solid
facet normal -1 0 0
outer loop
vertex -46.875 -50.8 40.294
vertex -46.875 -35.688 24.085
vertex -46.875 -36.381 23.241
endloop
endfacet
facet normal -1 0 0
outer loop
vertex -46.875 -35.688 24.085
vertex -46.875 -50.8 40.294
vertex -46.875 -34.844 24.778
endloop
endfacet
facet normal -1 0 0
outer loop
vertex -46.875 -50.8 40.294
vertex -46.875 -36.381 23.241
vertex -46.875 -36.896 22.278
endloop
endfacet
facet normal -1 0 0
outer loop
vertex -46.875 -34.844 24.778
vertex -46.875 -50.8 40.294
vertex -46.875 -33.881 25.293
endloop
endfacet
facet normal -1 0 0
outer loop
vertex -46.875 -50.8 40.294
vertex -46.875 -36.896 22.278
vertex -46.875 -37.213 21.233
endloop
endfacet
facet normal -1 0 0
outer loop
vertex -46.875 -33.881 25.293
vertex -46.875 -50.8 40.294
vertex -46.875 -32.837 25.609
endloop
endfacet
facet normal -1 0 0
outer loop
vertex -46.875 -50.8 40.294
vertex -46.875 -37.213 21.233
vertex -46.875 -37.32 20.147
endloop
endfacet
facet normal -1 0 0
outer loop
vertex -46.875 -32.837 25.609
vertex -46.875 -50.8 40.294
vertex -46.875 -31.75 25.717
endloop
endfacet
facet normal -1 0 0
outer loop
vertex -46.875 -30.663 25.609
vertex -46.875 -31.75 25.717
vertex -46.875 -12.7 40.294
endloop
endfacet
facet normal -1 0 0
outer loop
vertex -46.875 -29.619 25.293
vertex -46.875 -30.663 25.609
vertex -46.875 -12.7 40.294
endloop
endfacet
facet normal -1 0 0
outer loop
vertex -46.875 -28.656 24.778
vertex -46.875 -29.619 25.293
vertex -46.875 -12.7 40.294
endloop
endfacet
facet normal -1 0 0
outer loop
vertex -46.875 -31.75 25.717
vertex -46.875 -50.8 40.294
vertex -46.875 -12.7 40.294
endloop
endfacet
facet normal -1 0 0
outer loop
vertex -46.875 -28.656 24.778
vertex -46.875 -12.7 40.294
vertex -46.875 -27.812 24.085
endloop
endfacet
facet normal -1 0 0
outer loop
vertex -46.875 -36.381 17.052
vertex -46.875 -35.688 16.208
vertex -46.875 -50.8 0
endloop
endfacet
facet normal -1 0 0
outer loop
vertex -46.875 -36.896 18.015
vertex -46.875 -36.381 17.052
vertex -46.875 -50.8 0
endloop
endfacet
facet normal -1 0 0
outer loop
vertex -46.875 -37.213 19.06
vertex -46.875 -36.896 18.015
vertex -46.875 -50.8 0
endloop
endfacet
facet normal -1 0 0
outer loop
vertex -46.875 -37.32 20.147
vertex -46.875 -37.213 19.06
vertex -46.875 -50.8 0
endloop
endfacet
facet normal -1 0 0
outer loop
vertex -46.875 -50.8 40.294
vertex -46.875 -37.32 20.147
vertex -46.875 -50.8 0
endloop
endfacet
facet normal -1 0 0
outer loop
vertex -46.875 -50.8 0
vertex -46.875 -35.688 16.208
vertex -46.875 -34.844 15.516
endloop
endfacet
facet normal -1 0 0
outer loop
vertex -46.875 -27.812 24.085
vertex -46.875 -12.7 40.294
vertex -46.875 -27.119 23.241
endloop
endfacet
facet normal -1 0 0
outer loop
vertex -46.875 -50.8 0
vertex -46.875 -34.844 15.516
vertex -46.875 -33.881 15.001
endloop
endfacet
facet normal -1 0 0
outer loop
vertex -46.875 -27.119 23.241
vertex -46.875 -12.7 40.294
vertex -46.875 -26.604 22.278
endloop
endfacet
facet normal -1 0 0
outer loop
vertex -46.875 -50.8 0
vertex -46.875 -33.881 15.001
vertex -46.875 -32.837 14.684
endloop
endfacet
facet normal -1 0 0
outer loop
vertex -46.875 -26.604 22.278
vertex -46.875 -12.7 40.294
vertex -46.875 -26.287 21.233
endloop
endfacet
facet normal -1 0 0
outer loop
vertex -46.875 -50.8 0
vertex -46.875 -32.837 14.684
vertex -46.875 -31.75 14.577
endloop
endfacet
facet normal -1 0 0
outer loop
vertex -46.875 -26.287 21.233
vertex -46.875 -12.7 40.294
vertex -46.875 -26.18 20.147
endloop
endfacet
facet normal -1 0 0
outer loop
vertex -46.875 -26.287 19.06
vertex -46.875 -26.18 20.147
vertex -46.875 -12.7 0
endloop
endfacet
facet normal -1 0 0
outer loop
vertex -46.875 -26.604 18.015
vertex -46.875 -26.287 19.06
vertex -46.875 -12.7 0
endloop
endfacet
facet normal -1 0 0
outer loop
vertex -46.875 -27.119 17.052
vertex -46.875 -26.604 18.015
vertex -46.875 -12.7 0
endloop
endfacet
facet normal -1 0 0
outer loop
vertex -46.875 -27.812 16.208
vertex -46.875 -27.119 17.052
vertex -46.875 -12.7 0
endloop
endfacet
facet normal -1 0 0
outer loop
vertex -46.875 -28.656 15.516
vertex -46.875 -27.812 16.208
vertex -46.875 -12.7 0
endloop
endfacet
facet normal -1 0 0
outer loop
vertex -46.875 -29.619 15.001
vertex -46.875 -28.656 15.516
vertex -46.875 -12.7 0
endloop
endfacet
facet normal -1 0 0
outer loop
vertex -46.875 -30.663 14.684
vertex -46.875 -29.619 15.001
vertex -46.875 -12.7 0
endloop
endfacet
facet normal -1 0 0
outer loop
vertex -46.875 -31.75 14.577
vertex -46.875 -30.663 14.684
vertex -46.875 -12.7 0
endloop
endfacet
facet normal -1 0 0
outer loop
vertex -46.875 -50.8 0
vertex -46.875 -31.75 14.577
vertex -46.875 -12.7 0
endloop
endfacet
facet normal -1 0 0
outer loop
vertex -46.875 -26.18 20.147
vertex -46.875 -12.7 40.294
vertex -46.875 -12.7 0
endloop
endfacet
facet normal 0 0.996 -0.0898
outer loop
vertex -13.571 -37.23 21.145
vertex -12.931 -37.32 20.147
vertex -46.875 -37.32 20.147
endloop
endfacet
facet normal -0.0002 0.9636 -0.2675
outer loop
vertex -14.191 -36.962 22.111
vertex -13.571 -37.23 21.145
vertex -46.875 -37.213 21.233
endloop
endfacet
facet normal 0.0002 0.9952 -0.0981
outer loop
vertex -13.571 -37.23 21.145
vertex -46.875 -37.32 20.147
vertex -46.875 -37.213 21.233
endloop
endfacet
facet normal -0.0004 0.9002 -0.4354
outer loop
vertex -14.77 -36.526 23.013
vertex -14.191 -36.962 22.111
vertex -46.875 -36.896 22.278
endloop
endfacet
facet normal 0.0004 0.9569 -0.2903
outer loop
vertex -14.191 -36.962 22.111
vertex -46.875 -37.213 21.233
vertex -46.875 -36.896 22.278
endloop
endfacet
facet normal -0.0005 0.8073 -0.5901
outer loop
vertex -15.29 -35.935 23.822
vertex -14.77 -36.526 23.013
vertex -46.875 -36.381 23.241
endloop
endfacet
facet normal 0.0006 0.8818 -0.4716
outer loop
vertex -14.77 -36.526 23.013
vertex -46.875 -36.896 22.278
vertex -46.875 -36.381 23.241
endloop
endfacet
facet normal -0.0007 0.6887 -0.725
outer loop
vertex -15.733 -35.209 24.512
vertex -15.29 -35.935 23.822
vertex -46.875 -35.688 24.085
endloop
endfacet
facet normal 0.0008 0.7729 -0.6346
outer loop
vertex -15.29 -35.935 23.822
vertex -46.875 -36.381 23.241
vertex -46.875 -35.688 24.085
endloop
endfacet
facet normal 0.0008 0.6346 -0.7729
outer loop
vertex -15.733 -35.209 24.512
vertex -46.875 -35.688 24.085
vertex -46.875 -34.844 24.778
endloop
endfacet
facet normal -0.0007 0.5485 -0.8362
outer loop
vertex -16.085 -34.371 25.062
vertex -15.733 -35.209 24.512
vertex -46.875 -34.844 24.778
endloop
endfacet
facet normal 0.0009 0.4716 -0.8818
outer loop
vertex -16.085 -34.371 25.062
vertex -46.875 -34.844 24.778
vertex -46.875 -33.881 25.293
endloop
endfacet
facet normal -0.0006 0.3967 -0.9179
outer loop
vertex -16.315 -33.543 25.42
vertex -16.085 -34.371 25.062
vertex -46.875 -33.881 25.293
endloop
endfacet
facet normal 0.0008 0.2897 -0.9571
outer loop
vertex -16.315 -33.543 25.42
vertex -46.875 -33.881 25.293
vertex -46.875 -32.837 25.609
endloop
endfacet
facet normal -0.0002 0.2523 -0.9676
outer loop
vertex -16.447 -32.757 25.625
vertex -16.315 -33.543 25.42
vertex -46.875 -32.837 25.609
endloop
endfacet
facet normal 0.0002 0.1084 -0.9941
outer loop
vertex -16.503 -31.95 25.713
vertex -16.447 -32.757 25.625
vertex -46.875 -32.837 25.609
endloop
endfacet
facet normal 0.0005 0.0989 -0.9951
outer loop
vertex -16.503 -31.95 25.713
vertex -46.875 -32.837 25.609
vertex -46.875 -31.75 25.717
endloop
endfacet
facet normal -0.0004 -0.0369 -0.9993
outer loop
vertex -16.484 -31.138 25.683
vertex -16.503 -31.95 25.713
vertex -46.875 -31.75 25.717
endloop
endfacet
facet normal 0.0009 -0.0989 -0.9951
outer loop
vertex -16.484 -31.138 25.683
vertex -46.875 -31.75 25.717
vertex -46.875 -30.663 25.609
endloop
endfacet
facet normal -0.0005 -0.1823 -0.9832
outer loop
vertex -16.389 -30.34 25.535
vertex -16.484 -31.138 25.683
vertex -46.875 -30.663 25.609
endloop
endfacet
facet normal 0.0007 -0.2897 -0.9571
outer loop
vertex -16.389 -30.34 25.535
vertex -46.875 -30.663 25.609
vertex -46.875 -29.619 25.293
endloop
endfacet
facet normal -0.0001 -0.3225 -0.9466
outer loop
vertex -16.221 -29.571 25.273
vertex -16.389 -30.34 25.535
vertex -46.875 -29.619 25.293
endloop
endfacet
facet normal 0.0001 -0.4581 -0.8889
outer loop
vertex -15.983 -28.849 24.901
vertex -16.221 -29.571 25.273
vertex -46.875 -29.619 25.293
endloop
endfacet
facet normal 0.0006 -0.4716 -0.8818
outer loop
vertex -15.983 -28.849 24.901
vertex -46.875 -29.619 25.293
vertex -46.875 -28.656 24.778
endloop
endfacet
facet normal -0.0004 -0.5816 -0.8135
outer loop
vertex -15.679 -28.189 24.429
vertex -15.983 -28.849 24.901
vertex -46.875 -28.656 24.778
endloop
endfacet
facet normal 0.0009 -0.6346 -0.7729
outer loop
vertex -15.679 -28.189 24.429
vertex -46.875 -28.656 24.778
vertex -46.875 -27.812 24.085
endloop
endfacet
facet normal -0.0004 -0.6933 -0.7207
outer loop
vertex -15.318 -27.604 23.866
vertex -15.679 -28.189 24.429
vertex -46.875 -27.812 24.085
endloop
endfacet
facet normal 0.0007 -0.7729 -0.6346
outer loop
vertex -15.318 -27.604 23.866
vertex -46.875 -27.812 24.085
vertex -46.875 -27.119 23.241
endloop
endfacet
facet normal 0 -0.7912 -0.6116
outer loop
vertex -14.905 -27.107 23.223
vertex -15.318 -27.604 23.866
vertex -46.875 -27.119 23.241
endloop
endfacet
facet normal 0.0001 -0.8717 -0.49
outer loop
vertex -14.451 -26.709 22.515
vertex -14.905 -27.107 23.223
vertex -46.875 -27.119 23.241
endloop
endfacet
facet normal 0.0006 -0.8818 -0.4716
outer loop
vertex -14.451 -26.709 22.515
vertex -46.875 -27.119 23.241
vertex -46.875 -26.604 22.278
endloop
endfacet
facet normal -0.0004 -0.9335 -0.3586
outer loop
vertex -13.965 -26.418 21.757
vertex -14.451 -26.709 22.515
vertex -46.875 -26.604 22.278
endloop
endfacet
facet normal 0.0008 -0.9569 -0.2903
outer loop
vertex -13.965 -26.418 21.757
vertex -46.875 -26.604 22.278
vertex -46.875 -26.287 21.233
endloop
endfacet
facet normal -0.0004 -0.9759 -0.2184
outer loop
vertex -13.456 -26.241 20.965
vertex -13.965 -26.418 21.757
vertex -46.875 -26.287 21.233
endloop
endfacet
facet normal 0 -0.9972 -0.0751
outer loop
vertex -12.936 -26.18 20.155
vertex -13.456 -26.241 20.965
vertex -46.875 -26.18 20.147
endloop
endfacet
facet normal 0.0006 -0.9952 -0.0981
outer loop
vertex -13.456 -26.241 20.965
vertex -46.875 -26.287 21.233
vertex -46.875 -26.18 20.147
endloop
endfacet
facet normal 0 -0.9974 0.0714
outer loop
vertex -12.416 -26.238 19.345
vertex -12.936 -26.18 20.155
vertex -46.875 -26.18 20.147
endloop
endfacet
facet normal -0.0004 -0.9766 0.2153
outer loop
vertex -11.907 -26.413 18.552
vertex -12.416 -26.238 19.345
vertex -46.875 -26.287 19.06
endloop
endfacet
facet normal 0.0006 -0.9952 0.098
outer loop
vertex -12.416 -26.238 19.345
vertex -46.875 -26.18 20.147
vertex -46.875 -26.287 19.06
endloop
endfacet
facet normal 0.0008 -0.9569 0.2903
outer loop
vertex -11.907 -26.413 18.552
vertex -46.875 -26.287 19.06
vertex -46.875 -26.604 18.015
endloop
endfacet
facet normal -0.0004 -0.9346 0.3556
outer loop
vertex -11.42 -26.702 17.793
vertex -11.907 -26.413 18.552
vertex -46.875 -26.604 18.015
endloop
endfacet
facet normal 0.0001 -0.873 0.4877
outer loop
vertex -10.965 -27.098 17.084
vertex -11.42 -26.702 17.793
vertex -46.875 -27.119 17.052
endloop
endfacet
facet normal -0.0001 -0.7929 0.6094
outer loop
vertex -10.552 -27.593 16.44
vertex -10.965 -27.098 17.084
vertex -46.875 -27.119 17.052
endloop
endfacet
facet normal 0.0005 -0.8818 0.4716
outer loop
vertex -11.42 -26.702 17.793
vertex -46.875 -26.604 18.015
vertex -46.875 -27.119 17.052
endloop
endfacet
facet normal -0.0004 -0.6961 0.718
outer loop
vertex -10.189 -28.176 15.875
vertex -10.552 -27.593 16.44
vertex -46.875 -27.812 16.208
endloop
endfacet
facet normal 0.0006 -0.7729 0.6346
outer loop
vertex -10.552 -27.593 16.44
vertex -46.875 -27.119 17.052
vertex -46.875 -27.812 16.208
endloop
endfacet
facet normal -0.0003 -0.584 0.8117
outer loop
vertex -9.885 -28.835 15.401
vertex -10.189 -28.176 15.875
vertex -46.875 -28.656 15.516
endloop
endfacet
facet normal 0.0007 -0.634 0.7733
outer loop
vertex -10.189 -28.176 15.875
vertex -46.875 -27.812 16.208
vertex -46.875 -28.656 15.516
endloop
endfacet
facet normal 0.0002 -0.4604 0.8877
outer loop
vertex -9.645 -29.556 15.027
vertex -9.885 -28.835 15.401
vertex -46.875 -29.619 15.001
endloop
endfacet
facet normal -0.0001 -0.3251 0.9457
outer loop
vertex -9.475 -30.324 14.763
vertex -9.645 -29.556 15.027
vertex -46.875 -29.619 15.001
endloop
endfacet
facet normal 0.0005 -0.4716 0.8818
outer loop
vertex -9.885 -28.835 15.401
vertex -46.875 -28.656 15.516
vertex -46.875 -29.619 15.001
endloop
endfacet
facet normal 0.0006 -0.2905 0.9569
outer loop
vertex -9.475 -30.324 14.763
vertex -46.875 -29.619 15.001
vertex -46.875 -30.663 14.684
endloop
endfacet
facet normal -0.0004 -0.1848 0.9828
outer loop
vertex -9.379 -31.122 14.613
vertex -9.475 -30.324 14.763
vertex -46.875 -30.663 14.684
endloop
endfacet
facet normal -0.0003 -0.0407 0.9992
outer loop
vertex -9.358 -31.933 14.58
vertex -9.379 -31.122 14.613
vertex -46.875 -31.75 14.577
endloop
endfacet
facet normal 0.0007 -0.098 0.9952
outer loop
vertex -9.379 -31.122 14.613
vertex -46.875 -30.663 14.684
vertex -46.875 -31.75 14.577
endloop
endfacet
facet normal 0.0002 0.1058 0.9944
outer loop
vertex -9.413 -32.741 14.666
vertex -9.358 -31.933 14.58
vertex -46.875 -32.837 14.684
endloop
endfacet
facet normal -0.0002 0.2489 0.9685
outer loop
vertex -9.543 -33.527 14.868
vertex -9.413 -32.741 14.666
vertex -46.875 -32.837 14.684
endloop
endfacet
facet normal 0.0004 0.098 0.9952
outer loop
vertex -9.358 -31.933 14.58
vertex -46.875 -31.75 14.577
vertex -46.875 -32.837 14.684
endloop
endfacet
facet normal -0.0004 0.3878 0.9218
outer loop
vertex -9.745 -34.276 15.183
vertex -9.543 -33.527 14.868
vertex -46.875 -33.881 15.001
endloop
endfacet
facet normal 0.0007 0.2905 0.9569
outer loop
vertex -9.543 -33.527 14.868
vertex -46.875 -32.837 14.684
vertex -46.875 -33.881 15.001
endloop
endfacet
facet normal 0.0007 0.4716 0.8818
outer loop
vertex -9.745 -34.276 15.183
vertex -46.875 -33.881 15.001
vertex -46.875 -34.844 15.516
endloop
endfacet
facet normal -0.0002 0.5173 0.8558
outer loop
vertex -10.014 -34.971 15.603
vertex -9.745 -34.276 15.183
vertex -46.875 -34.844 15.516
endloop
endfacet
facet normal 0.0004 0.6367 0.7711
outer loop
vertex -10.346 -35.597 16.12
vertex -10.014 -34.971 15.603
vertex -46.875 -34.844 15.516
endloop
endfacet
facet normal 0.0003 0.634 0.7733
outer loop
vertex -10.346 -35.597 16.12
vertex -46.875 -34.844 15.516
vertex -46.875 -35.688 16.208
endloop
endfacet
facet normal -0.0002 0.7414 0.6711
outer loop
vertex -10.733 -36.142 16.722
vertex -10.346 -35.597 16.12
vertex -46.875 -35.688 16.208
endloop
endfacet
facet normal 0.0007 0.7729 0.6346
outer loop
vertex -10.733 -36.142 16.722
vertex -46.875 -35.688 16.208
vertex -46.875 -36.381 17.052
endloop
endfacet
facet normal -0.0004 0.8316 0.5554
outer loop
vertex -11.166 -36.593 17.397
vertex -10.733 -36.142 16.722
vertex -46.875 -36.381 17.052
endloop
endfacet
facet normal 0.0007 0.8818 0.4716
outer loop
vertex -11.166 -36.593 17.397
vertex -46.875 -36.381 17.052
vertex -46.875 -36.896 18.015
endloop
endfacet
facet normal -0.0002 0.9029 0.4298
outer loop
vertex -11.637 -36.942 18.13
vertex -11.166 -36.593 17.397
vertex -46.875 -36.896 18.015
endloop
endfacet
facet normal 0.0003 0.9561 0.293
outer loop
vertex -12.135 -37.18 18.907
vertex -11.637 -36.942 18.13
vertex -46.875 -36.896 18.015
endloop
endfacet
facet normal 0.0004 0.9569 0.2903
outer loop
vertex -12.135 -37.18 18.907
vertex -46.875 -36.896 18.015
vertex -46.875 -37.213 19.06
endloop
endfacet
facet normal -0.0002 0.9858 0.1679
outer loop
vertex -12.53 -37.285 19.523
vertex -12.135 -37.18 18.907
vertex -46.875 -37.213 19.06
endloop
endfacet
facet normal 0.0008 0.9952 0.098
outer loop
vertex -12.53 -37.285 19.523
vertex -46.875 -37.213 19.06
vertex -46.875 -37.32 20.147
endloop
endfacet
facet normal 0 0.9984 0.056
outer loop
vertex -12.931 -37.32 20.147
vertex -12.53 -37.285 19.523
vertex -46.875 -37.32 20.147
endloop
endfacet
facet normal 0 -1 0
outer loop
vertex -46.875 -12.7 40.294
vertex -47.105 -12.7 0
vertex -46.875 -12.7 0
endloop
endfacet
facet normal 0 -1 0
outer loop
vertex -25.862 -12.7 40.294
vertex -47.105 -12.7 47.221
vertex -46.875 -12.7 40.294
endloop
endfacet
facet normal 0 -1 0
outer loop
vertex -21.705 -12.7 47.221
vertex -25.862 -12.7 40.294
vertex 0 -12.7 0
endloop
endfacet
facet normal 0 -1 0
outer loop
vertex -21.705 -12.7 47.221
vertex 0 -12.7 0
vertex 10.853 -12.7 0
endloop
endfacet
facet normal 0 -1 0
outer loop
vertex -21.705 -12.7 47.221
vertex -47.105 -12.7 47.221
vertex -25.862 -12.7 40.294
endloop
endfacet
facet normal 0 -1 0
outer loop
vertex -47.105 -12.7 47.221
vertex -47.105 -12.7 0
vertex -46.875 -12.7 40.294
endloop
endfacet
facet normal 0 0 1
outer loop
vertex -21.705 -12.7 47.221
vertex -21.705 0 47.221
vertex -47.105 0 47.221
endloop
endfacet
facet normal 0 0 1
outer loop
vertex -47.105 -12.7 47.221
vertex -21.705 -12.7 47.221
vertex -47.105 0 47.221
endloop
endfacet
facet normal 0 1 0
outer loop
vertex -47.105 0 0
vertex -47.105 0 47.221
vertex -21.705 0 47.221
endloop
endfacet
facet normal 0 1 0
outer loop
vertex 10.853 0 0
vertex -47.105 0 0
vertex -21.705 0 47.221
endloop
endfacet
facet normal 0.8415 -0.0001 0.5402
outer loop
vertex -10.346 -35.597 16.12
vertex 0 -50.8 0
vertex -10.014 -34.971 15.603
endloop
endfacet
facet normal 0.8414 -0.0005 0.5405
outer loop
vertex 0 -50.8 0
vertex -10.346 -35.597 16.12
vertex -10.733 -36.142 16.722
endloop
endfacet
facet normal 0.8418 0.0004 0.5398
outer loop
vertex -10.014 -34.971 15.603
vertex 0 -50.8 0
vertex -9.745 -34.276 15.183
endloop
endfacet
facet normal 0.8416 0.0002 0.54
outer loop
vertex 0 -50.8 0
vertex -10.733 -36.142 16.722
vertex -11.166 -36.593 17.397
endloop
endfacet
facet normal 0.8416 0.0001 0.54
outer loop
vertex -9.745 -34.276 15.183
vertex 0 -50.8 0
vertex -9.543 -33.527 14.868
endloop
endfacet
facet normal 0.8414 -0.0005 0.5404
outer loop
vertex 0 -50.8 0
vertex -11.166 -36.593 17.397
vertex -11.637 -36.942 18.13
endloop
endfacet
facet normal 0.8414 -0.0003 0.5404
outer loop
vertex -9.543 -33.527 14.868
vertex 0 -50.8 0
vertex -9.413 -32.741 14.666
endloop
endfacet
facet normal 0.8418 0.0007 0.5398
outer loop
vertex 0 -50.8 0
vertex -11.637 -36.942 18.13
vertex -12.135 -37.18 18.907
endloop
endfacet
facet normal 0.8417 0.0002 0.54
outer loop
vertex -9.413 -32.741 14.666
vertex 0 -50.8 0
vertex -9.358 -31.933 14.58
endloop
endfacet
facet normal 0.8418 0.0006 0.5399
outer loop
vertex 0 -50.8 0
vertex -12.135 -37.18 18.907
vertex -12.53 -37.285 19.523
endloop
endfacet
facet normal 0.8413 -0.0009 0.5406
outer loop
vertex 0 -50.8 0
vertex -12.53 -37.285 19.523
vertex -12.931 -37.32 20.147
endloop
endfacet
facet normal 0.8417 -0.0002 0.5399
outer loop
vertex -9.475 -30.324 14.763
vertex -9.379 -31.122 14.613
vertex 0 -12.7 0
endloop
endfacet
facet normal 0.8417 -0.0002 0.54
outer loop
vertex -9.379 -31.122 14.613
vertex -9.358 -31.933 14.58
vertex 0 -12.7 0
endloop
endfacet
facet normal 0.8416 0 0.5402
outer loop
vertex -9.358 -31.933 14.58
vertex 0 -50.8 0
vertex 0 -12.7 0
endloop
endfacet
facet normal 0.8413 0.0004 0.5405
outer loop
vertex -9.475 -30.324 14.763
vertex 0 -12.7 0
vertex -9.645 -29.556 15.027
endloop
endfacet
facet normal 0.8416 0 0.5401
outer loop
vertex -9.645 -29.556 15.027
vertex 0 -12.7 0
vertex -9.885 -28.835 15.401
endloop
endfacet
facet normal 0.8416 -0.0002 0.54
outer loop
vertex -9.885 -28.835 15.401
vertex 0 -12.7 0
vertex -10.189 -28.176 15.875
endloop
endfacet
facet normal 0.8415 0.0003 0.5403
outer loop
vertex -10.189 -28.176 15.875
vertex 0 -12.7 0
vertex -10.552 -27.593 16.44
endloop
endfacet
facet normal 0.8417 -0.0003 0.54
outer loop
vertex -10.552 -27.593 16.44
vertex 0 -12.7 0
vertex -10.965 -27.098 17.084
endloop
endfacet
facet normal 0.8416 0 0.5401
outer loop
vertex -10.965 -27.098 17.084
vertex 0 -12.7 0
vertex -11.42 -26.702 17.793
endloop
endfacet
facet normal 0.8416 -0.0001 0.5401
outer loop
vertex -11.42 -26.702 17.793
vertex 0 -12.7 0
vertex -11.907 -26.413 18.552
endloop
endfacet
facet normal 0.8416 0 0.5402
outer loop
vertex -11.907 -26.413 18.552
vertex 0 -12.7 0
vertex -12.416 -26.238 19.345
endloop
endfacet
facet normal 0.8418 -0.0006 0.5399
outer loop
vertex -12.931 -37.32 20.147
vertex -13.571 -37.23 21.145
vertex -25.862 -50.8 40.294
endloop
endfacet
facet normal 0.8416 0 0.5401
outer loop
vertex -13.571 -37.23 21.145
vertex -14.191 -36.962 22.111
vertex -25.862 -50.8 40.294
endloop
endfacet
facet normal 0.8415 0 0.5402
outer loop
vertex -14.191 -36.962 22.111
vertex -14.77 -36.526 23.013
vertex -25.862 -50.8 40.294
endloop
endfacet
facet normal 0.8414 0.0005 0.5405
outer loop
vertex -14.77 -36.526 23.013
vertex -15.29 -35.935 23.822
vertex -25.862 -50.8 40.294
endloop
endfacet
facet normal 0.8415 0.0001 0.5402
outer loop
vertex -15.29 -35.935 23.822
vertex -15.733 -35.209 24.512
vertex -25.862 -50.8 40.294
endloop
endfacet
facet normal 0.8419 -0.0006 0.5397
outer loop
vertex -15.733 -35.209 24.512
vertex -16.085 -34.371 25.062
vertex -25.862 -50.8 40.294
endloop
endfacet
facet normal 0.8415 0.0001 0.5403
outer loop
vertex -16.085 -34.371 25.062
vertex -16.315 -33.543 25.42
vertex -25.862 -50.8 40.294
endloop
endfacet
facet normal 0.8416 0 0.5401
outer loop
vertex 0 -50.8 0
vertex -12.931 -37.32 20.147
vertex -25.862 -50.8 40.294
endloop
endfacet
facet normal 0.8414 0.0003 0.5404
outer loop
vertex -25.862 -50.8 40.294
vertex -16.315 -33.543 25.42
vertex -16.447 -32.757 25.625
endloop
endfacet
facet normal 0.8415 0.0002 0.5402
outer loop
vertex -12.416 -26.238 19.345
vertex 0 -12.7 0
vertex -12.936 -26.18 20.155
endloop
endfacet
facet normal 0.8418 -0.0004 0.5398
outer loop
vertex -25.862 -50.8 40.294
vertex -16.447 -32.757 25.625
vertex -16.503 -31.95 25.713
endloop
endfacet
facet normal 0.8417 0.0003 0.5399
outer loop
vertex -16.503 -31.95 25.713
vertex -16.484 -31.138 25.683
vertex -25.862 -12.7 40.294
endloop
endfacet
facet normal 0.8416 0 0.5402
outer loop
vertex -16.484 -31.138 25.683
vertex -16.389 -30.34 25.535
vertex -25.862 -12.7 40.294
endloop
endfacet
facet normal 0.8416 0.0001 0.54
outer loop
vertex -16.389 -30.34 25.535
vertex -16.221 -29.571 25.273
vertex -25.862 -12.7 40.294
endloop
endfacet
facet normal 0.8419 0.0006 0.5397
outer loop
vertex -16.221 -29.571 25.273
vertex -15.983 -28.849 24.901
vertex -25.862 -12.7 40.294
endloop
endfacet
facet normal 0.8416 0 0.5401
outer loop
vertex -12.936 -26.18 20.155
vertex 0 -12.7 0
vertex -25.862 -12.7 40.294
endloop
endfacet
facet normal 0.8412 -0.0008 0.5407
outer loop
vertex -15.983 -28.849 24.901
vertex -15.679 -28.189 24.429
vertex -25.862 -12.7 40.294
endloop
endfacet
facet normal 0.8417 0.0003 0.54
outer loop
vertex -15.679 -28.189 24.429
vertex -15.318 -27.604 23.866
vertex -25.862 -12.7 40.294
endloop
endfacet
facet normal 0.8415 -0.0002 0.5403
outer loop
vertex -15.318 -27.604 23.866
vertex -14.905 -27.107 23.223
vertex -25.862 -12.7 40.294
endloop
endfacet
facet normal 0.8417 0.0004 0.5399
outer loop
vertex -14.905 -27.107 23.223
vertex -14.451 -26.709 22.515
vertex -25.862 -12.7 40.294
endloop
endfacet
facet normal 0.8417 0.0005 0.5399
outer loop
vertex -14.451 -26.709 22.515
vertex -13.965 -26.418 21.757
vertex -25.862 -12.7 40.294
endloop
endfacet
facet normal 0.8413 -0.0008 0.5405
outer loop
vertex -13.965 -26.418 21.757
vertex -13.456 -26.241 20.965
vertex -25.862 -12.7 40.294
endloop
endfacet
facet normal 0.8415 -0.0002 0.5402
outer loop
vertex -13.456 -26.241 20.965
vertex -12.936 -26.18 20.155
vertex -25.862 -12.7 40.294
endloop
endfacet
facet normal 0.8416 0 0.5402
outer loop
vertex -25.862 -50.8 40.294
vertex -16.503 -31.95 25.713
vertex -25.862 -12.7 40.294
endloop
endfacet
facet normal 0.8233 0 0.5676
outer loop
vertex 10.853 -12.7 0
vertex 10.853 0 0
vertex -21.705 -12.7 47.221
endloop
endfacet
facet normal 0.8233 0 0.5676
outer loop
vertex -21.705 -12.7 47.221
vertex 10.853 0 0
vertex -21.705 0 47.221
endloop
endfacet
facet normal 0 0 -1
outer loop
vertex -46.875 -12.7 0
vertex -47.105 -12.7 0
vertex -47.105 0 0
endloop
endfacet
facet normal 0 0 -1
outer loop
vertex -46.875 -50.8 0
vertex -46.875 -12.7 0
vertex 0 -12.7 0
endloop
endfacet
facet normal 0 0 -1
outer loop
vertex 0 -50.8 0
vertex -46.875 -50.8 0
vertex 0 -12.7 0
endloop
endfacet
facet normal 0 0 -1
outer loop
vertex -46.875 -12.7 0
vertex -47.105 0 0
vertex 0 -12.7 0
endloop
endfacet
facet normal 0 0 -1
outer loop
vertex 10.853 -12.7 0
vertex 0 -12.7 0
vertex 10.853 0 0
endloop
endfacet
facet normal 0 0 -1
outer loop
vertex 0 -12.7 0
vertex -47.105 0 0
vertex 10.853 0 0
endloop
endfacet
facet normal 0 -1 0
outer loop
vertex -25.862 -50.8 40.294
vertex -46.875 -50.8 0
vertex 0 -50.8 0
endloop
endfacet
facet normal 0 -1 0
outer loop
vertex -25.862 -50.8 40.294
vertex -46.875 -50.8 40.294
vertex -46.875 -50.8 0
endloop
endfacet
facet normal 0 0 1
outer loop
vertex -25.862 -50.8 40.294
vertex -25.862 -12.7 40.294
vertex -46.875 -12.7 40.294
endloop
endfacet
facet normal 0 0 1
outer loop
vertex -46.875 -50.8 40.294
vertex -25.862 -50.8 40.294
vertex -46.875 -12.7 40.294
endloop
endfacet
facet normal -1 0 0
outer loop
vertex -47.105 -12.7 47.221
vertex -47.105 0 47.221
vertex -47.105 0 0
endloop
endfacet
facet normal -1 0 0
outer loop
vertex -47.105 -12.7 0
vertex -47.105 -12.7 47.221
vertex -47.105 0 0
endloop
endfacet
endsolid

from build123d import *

# Parameters (mm, degrees)
F1_DEPTH = 50.8
F3_DEPTH = 12.7
F4_R     = 5.569694
F5_DEPTH = 50.8


with BuildPart() as f1:
    # F0 (on Front) → F1 (new body)
    with BuildSketch(Plane.XZ):
        Polygon((-46.874546, 0), (0, 0), (-25.861818, 40.293638), (-46.874546, 40.293638), align=None)
    extrude(amount=F1_DEPTH)

    # F2 (on Front) → F3 (join)
    with BuildSketch(Plane.XZ):
        Polygon((-47.105454, 47.220912), (-47.105454, 0), (10.852728, 0), (-21.705456, 47.220912), align=None)
    extrude(amount=F3_DEPTH)

    # F4 (on face) → F5 (cut)
    with BuildSketch(Plane(origin=(-46.874546, 0, 0), x_dir=(0, -1, 0), z_dir=(-1, 0, 0))):
        with Locations((31.75, 20.146819)):
            Circle(F4_R)
    extrude(amount=-F5_DEPTH, mode=Mode.SUBTRACT)


solid = f1.part
